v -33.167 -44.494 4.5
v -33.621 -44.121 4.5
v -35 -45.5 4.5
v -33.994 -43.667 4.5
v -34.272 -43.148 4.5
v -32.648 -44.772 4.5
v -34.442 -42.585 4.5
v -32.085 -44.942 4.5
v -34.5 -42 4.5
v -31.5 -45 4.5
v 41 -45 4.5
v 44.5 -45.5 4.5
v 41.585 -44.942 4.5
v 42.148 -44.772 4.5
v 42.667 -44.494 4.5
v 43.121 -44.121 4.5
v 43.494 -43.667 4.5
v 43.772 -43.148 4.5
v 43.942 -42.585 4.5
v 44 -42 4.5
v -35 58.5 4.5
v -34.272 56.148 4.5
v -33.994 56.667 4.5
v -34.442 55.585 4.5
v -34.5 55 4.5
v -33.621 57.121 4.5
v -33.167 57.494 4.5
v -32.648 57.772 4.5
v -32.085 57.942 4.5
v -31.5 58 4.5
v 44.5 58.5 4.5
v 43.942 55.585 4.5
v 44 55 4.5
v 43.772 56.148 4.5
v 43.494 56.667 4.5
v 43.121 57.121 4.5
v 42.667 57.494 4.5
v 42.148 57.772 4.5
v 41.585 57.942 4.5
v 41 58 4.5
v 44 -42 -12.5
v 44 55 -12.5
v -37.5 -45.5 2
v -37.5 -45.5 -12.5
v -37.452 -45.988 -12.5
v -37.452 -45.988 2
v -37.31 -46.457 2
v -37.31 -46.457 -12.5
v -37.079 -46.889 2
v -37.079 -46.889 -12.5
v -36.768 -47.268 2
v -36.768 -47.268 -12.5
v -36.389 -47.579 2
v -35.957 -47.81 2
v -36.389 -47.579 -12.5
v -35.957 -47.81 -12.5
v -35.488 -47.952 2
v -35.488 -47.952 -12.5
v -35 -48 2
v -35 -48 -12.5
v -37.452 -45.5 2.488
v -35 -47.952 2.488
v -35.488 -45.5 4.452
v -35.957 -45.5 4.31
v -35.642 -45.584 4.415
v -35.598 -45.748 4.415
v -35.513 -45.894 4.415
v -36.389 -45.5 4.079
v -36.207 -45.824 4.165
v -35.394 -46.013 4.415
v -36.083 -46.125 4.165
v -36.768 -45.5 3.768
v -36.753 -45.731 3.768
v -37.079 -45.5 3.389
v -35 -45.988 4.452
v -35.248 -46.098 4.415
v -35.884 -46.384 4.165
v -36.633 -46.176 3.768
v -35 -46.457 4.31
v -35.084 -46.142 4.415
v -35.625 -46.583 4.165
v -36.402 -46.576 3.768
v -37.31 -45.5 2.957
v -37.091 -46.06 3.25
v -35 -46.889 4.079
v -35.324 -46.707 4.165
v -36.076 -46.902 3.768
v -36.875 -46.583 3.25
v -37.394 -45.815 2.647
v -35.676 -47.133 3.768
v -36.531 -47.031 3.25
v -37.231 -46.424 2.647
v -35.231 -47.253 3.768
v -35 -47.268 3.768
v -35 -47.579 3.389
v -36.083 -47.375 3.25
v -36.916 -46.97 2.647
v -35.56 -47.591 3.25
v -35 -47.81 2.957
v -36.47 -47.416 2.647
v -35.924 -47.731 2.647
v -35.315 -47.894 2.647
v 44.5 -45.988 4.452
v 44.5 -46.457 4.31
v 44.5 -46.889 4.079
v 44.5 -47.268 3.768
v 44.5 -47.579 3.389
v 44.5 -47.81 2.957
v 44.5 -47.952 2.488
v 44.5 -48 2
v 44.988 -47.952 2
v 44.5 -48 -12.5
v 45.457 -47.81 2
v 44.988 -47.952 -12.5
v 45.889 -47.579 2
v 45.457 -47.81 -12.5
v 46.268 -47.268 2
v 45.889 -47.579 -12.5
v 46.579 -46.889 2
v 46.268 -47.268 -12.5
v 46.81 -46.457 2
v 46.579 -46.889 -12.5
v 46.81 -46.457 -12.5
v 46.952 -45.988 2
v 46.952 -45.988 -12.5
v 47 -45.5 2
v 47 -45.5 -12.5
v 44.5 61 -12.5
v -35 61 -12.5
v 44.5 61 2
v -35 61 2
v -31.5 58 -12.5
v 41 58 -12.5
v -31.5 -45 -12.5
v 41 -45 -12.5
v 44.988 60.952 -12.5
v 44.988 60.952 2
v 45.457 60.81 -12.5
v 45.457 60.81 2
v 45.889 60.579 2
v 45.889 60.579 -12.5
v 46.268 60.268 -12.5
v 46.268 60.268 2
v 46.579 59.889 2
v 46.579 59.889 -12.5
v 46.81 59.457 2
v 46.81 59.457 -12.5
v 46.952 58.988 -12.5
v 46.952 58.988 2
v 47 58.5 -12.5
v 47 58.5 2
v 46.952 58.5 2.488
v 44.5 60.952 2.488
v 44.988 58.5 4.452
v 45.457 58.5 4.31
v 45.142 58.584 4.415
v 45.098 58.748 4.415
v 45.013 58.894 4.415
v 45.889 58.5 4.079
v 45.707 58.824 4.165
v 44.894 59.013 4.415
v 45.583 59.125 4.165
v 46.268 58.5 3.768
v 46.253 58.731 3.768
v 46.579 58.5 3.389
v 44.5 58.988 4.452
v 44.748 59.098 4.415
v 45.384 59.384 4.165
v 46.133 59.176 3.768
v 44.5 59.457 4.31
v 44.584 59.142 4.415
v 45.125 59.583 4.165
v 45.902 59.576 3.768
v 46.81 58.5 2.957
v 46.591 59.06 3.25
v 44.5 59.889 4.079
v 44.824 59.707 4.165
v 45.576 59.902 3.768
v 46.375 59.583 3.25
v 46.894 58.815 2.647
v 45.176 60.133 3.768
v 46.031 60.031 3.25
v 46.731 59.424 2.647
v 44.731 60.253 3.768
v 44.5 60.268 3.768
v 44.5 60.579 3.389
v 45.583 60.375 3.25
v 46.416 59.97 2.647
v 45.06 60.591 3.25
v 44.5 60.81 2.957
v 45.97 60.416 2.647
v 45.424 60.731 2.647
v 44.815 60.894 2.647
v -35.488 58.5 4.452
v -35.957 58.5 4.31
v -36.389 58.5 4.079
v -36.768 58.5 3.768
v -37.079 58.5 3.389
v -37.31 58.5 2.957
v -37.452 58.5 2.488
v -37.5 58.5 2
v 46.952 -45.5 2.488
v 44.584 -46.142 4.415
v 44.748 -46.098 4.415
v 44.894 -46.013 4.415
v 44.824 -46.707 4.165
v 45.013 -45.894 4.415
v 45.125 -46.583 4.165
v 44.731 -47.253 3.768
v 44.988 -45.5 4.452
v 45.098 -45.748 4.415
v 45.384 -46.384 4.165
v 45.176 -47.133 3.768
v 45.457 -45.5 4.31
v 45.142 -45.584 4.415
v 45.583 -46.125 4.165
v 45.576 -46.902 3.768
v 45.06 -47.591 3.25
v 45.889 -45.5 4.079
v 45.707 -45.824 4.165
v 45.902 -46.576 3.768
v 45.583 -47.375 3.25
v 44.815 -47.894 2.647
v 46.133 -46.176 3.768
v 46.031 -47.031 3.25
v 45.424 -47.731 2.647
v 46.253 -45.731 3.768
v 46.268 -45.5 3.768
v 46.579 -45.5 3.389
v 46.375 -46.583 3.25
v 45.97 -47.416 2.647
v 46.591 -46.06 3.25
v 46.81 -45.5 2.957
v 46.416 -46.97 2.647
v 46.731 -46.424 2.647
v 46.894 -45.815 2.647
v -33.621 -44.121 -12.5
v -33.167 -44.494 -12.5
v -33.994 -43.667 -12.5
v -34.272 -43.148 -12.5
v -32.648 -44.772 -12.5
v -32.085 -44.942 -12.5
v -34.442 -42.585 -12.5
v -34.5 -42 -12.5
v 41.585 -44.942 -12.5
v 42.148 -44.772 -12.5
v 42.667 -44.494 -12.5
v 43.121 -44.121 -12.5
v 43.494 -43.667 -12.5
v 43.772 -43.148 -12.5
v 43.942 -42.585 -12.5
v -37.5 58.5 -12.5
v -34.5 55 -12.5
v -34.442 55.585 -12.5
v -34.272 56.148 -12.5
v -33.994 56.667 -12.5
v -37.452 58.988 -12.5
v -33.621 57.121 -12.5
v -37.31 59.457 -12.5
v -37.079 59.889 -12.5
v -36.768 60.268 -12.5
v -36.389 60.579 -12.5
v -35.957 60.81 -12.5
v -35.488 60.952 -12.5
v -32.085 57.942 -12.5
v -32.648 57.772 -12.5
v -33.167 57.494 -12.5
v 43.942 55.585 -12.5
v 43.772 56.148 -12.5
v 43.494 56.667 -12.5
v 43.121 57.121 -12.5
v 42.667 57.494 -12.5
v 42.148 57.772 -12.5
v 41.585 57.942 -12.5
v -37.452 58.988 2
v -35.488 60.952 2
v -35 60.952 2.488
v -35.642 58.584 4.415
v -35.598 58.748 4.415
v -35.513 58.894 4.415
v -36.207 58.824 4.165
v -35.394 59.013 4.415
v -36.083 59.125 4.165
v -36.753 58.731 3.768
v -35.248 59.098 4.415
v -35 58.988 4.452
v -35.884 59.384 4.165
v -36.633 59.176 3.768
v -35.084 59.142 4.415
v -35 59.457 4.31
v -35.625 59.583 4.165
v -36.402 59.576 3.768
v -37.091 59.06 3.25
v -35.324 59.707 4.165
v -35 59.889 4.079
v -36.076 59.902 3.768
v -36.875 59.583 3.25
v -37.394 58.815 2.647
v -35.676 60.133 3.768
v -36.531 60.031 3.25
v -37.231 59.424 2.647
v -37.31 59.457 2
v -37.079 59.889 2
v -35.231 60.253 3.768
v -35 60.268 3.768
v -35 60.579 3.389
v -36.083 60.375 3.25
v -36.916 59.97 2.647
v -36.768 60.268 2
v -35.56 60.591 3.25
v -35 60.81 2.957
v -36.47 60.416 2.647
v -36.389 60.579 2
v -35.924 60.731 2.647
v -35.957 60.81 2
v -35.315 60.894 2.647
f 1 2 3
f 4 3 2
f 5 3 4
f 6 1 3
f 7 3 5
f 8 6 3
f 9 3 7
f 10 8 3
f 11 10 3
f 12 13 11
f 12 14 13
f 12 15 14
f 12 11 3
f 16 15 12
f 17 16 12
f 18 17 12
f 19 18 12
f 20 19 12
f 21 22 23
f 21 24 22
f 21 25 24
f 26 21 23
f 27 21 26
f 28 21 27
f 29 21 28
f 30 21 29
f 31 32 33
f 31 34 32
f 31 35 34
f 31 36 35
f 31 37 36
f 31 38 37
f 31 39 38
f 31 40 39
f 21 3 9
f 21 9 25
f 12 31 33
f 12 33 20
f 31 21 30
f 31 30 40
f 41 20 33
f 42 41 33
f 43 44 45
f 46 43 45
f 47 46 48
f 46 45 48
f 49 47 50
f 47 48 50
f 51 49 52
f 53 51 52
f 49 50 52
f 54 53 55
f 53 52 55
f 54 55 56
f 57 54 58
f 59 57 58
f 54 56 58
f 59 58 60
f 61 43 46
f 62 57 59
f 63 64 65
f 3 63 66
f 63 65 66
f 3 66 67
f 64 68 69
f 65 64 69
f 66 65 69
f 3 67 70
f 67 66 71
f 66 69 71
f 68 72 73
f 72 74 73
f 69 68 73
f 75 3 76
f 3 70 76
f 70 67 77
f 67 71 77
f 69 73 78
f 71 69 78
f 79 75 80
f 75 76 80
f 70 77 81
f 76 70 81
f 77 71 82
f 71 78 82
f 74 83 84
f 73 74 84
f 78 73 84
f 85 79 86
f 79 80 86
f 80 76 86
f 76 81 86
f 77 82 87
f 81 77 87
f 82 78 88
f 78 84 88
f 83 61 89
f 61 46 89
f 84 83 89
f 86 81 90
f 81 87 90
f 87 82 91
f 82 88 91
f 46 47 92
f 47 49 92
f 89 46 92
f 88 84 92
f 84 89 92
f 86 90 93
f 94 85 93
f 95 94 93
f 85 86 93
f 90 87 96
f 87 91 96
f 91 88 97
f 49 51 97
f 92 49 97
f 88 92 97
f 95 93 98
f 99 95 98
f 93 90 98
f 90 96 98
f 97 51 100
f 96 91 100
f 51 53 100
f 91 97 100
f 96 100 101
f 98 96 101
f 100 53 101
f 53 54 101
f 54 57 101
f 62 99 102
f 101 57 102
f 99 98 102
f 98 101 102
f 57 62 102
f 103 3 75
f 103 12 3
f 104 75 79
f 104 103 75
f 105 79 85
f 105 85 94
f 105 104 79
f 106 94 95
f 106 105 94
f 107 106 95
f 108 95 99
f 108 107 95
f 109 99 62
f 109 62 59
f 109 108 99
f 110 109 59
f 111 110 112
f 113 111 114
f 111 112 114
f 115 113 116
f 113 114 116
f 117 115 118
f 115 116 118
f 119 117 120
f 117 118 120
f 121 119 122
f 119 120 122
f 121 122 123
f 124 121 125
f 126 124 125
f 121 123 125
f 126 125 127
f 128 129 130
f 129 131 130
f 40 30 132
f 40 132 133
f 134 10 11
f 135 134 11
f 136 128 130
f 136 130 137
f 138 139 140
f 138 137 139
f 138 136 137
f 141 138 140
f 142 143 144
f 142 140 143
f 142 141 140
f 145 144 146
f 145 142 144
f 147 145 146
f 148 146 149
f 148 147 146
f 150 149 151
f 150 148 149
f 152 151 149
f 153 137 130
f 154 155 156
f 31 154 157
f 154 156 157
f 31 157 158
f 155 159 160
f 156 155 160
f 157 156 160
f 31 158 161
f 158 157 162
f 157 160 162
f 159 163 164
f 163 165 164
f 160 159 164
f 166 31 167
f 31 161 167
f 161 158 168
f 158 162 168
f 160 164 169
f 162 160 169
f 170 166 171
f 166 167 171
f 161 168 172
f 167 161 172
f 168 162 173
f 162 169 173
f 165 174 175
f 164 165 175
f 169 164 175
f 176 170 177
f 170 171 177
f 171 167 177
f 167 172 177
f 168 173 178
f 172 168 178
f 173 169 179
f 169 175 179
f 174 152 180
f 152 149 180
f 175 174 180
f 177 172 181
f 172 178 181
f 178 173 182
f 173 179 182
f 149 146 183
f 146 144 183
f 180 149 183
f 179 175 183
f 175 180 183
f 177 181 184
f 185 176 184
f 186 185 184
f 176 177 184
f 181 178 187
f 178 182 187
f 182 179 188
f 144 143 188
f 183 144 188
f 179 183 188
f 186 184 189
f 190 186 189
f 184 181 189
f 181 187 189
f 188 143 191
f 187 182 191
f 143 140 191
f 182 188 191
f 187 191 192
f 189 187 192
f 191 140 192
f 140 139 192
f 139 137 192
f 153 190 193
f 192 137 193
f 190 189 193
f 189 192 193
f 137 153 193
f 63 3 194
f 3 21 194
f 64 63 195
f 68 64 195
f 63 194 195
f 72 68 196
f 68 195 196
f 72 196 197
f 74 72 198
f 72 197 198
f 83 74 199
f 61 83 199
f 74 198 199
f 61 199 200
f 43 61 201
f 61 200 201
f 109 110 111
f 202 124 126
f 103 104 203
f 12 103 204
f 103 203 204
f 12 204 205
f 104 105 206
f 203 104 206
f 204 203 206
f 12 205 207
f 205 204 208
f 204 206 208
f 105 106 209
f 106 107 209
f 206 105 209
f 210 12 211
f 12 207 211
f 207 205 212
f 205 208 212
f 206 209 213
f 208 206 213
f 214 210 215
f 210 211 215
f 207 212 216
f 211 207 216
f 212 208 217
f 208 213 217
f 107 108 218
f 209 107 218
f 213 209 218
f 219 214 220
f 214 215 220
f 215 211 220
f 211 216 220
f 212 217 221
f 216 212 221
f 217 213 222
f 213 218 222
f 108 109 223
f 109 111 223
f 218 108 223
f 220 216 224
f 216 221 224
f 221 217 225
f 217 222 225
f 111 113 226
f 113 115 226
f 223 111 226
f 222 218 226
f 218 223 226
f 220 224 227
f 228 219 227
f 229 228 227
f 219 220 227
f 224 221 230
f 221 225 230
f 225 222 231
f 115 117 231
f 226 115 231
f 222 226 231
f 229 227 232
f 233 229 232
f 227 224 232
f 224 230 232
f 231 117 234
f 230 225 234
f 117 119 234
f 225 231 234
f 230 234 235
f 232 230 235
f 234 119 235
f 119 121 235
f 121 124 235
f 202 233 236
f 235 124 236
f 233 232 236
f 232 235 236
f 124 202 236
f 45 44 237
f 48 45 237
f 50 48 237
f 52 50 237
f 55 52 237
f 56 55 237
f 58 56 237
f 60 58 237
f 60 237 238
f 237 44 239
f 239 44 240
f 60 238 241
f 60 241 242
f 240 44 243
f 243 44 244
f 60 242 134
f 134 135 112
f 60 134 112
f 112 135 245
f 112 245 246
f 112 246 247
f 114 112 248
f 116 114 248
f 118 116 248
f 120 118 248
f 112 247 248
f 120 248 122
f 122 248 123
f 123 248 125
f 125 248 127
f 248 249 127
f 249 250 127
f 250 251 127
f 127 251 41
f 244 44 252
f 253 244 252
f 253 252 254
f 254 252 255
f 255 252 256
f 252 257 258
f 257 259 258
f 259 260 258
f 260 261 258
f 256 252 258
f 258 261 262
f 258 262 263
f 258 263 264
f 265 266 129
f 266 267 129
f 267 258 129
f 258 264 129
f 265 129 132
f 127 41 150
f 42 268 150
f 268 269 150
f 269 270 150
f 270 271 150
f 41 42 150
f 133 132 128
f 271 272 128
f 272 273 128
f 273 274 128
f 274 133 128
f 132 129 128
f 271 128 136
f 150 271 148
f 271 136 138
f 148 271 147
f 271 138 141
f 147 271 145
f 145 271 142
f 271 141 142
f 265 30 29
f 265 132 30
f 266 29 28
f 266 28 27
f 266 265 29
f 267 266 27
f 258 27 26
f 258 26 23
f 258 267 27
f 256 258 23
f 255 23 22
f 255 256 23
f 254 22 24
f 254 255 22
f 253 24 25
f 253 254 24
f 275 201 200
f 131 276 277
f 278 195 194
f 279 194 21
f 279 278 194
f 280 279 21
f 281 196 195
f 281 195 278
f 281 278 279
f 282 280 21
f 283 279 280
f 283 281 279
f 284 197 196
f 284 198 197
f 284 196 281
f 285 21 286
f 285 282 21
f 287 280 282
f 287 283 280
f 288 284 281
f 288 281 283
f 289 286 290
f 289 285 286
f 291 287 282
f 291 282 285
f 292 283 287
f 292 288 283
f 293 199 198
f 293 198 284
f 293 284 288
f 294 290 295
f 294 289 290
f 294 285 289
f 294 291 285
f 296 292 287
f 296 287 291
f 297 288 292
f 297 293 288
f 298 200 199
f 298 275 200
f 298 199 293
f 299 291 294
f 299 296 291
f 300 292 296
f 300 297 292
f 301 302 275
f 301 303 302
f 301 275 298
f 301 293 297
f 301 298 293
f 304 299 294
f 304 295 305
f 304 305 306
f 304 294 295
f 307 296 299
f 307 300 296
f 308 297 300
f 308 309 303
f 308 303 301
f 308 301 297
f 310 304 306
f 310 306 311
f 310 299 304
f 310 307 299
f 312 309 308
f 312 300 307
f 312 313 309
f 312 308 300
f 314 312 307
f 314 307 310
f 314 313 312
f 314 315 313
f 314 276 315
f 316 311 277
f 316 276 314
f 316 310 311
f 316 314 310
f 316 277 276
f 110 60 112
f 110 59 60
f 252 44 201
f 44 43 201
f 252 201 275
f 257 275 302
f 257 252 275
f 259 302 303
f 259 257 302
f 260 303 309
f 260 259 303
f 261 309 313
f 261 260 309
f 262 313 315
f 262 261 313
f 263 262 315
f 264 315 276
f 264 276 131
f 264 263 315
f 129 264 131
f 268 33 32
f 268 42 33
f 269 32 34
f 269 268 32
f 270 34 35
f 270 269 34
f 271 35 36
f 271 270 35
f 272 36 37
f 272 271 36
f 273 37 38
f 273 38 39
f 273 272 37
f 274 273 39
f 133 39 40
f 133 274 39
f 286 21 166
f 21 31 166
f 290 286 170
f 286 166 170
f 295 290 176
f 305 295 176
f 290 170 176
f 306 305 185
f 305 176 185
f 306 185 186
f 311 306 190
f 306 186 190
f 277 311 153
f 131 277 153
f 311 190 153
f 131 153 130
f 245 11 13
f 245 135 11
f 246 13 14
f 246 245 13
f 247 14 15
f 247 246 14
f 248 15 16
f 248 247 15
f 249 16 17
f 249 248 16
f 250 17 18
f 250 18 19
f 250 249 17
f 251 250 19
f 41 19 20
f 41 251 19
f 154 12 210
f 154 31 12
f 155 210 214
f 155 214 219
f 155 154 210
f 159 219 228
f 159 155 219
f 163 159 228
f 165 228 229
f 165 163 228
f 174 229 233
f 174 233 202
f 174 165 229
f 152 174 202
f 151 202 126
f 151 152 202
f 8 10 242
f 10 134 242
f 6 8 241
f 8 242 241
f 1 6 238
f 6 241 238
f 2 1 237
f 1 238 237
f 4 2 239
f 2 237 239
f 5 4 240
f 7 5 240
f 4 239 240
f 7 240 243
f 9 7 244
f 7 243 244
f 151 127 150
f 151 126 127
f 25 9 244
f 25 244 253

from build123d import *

# Parameters (mm, degrees)
SKETCH014_W   = 84.5
SKETCH014_H   = 109
SKETCH014_W_2 = 78.5
SKETCH014_H_2 = 103
PAD006_DEPTH  = 17
FILLET002_R   = 3
FILLET004_R   = 2.5


with BuildPart() as part:
    # Sketch014 → Pad006 (new body)
    with BuildSketch(Plane.XY):
        with Locations((4.75, 6.5)):
            Rectangle(SKETCH014_W, SKETCH014_H)
        with Locations((4.75, 6.5)):
            Rectangle(SKETCH014_W_2, SKETCH014_H_2, mode=Mode.SUBTRACT)
    extrude(amount=-PAD006_DEPTH)

    # Fillet002
    fillet002_edges = [part.edges().sort_by_distance(p)[0] for p in [
        (-34.5, 58, -8.5),
        (-34.5, -45, -8.5),
        (44, 58, -8.5),
        (44, -45, -8.5),
    ]]
    fillet(fillet002_edges, radius=FILLET002_R)

    # Fillet004
    fillet004_edges = [part.edges().sort_by_distance(p)[0] for p in [
        (47, 61, -8.5),
        (-37.5, 61, -8.5),
        (47, -48, -8.5),
        (-37.5, -48, -8.5),
        (-37.5, 6.5, 0),
        (4.75, -48, 0),
        (47, 6.5, 0),
        (4.75, 61, 0),
    ]]
    fillet(fillet004_edges, radius=FILLET004_R)


with BuildPart() as part_1:
    # Body005 placement: moved
    add(part.part.moved(Location((0, 0, 4.5))))


solid = part_1.part
